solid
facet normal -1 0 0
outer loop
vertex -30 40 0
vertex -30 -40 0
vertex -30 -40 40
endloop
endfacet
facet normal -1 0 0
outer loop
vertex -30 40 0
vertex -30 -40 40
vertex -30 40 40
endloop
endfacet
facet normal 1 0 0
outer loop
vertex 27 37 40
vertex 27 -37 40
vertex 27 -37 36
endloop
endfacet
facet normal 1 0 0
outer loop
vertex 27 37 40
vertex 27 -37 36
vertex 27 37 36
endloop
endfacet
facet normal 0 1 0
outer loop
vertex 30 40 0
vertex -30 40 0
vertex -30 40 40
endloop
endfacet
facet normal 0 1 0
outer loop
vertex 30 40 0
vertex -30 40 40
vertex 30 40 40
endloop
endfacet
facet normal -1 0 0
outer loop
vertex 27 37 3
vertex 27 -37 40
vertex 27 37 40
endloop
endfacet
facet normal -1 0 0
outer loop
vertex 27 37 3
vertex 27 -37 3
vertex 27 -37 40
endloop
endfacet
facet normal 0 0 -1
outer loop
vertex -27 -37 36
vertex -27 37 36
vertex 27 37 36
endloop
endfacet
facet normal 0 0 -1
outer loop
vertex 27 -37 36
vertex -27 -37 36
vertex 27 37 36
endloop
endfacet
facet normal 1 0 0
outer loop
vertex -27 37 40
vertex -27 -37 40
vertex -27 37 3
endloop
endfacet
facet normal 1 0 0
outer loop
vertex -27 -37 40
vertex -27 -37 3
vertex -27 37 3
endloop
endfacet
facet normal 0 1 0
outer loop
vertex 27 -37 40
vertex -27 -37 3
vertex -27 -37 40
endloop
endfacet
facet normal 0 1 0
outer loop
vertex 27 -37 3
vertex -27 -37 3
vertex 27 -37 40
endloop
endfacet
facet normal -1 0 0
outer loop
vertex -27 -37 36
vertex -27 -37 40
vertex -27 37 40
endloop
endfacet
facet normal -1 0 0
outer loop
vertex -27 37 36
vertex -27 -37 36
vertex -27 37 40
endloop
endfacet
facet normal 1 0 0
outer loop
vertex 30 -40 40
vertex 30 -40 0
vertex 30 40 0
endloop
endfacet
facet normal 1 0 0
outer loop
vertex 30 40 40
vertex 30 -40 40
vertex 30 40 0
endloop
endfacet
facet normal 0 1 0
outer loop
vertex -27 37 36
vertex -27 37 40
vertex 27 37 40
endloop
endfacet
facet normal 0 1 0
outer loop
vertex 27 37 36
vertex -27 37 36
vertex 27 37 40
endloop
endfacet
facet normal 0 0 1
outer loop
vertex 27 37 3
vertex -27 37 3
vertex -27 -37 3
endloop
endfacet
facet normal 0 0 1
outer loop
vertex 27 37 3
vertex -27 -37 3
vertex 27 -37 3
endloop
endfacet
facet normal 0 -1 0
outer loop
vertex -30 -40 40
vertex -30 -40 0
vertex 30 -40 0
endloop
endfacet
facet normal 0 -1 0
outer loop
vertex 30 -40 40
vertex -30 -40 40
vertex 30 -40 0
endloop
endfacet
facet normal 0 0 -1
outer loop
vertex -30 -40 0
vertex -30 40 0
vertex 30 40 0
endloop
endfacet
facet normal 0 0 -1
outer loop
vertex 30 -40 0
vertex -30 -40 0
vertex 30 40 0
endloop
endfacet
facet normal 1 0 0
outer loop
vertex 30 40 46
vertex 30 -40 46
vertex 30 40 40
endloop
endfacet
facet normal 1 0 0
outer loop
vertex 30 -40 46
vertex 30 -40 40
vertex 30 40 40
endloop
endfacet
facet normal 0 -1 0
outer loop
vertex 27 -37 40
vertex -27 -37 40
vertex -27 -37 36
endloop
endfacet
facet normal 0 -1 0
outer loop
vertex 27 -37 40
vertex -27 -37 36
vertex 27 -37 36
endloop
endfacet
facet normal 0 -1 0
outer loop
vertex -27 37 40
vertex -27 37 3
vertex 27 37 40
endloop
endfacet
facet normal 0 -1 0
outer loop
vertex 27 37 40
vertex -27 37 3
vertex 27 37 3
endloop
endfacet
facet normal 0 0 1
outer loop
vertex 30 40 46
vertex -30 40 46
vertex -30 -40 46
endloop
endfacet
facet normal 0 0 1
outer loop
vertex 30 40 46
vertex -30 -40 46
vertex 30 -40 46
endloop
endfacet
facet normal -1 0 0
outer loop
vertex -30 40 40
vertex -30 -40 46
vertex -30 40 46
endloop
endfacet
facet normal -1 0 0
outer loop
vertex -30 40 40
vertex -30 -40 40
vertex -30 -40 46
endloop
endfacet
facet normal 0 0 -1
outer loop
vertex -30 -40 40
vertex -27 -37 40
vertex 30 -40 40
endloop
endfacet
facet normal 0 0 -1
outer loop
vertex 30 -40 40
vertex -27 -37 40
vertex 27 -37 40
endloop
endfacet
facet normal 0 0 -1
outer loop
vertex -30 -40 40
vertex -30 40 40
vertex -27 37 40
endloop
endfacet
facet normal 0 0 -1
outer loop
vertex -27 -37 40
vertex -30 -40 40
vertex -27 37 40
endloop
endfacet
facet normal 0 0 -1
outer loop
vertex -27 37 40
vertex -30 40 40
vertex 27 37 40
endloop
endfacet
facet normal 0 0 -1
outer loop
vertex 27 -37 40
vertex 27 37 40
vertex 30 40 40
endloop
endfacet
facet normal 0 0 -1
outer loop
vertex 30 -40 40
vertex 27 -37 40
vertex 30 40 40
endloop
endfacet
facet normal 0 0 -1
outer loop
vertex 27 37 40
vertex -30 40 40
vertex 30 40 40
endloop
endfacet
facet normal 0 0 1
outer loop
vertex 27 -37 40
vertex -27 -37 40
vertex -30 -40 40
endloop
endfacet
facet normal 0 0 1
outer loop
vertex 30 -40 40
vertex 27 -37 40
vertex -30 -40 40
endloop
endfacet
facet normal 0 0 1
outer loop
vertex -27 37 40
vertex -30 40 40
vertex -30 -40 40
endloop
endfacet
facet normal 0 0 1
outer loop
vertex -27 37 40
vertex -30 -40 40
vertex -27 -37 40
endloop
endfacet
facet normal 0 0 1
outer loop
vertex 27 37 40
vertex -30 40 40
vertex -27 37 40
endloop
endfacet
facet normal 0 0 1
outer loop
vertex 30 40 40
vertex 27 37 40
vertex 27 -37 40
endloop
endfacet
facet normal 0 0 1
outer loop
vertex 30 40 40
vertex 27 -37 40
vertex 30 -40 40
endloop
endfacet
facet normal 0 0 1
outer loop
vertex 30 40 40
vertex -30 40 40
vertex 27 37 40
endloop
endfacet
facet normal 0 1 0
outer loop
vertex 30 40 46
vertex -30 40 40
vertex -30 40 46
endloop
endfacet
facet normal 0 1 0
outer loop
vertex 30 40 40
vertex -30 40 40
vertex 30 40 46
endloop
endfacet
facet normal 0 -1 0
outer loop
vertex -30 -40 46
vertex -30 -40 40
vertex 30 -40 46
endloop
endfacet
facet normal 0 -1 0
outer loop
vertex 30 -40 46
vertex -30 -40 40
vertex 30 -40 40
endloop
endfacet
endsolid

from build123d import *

# Parameters (mm, degrees)
F0_W     = 60
F0_H     = 80
F1_DEPTH = 40
F2_T     = -3
F3_W     = 60
F3_H     = 80
F3_W_2   = 54
F3_H_2   = 74
F4_DEPTH = 3
F5_DEPTH = 3
F6_DEPTH = 4


# Not quite as in the source:
# - the program builds the solid bodies; features that only make, move or delete a surface that nothing else refers to are left out


with BuildPart() as f1:
    # F0 (on Top) → F1 (new body)
    with BuildSketch(Plane.XY):
        Rectangle(F0_W, F0_H)
    extrude(amount=F1_DEPTH)

    # F2
    f2_openings = [f1.faces().sort_by_distance(p)[0] for p in [
        (0, 0, 40),
    ]]
    offset(amount=F2_T, openings=f2_openings)


with BuildPart() as f4:
    # F3 (on face) → F4 (new body)
    with BuildSketch(Plane.XY.offset(40)):
        Rectangle(F3_W, F3_H)
        Rectangle(F3_W_2, F3_H_2, mode=Mode.SUBTRACT)
        Rectangle(F3_W_2, F3_H_2)
    extrude(amount=F4_DEPTH)

    # F5 (add): a face of the model
    f5_faces = [f4.faces().sort_by_distance(p)[0] for p in [
        (0, 0, 43),
    ]]
    extrude(f5_faces, amount=F5_DEPTH)

    # F3 (on face) → F6 (join)
    with BuildSketch(Plane.XY.offset(40)):
        Rectangle(F3_W_2, F3_H_2)
    extrude(amount=-F6_DEPTH)


solid = Compound([f1.part, f4.part])
